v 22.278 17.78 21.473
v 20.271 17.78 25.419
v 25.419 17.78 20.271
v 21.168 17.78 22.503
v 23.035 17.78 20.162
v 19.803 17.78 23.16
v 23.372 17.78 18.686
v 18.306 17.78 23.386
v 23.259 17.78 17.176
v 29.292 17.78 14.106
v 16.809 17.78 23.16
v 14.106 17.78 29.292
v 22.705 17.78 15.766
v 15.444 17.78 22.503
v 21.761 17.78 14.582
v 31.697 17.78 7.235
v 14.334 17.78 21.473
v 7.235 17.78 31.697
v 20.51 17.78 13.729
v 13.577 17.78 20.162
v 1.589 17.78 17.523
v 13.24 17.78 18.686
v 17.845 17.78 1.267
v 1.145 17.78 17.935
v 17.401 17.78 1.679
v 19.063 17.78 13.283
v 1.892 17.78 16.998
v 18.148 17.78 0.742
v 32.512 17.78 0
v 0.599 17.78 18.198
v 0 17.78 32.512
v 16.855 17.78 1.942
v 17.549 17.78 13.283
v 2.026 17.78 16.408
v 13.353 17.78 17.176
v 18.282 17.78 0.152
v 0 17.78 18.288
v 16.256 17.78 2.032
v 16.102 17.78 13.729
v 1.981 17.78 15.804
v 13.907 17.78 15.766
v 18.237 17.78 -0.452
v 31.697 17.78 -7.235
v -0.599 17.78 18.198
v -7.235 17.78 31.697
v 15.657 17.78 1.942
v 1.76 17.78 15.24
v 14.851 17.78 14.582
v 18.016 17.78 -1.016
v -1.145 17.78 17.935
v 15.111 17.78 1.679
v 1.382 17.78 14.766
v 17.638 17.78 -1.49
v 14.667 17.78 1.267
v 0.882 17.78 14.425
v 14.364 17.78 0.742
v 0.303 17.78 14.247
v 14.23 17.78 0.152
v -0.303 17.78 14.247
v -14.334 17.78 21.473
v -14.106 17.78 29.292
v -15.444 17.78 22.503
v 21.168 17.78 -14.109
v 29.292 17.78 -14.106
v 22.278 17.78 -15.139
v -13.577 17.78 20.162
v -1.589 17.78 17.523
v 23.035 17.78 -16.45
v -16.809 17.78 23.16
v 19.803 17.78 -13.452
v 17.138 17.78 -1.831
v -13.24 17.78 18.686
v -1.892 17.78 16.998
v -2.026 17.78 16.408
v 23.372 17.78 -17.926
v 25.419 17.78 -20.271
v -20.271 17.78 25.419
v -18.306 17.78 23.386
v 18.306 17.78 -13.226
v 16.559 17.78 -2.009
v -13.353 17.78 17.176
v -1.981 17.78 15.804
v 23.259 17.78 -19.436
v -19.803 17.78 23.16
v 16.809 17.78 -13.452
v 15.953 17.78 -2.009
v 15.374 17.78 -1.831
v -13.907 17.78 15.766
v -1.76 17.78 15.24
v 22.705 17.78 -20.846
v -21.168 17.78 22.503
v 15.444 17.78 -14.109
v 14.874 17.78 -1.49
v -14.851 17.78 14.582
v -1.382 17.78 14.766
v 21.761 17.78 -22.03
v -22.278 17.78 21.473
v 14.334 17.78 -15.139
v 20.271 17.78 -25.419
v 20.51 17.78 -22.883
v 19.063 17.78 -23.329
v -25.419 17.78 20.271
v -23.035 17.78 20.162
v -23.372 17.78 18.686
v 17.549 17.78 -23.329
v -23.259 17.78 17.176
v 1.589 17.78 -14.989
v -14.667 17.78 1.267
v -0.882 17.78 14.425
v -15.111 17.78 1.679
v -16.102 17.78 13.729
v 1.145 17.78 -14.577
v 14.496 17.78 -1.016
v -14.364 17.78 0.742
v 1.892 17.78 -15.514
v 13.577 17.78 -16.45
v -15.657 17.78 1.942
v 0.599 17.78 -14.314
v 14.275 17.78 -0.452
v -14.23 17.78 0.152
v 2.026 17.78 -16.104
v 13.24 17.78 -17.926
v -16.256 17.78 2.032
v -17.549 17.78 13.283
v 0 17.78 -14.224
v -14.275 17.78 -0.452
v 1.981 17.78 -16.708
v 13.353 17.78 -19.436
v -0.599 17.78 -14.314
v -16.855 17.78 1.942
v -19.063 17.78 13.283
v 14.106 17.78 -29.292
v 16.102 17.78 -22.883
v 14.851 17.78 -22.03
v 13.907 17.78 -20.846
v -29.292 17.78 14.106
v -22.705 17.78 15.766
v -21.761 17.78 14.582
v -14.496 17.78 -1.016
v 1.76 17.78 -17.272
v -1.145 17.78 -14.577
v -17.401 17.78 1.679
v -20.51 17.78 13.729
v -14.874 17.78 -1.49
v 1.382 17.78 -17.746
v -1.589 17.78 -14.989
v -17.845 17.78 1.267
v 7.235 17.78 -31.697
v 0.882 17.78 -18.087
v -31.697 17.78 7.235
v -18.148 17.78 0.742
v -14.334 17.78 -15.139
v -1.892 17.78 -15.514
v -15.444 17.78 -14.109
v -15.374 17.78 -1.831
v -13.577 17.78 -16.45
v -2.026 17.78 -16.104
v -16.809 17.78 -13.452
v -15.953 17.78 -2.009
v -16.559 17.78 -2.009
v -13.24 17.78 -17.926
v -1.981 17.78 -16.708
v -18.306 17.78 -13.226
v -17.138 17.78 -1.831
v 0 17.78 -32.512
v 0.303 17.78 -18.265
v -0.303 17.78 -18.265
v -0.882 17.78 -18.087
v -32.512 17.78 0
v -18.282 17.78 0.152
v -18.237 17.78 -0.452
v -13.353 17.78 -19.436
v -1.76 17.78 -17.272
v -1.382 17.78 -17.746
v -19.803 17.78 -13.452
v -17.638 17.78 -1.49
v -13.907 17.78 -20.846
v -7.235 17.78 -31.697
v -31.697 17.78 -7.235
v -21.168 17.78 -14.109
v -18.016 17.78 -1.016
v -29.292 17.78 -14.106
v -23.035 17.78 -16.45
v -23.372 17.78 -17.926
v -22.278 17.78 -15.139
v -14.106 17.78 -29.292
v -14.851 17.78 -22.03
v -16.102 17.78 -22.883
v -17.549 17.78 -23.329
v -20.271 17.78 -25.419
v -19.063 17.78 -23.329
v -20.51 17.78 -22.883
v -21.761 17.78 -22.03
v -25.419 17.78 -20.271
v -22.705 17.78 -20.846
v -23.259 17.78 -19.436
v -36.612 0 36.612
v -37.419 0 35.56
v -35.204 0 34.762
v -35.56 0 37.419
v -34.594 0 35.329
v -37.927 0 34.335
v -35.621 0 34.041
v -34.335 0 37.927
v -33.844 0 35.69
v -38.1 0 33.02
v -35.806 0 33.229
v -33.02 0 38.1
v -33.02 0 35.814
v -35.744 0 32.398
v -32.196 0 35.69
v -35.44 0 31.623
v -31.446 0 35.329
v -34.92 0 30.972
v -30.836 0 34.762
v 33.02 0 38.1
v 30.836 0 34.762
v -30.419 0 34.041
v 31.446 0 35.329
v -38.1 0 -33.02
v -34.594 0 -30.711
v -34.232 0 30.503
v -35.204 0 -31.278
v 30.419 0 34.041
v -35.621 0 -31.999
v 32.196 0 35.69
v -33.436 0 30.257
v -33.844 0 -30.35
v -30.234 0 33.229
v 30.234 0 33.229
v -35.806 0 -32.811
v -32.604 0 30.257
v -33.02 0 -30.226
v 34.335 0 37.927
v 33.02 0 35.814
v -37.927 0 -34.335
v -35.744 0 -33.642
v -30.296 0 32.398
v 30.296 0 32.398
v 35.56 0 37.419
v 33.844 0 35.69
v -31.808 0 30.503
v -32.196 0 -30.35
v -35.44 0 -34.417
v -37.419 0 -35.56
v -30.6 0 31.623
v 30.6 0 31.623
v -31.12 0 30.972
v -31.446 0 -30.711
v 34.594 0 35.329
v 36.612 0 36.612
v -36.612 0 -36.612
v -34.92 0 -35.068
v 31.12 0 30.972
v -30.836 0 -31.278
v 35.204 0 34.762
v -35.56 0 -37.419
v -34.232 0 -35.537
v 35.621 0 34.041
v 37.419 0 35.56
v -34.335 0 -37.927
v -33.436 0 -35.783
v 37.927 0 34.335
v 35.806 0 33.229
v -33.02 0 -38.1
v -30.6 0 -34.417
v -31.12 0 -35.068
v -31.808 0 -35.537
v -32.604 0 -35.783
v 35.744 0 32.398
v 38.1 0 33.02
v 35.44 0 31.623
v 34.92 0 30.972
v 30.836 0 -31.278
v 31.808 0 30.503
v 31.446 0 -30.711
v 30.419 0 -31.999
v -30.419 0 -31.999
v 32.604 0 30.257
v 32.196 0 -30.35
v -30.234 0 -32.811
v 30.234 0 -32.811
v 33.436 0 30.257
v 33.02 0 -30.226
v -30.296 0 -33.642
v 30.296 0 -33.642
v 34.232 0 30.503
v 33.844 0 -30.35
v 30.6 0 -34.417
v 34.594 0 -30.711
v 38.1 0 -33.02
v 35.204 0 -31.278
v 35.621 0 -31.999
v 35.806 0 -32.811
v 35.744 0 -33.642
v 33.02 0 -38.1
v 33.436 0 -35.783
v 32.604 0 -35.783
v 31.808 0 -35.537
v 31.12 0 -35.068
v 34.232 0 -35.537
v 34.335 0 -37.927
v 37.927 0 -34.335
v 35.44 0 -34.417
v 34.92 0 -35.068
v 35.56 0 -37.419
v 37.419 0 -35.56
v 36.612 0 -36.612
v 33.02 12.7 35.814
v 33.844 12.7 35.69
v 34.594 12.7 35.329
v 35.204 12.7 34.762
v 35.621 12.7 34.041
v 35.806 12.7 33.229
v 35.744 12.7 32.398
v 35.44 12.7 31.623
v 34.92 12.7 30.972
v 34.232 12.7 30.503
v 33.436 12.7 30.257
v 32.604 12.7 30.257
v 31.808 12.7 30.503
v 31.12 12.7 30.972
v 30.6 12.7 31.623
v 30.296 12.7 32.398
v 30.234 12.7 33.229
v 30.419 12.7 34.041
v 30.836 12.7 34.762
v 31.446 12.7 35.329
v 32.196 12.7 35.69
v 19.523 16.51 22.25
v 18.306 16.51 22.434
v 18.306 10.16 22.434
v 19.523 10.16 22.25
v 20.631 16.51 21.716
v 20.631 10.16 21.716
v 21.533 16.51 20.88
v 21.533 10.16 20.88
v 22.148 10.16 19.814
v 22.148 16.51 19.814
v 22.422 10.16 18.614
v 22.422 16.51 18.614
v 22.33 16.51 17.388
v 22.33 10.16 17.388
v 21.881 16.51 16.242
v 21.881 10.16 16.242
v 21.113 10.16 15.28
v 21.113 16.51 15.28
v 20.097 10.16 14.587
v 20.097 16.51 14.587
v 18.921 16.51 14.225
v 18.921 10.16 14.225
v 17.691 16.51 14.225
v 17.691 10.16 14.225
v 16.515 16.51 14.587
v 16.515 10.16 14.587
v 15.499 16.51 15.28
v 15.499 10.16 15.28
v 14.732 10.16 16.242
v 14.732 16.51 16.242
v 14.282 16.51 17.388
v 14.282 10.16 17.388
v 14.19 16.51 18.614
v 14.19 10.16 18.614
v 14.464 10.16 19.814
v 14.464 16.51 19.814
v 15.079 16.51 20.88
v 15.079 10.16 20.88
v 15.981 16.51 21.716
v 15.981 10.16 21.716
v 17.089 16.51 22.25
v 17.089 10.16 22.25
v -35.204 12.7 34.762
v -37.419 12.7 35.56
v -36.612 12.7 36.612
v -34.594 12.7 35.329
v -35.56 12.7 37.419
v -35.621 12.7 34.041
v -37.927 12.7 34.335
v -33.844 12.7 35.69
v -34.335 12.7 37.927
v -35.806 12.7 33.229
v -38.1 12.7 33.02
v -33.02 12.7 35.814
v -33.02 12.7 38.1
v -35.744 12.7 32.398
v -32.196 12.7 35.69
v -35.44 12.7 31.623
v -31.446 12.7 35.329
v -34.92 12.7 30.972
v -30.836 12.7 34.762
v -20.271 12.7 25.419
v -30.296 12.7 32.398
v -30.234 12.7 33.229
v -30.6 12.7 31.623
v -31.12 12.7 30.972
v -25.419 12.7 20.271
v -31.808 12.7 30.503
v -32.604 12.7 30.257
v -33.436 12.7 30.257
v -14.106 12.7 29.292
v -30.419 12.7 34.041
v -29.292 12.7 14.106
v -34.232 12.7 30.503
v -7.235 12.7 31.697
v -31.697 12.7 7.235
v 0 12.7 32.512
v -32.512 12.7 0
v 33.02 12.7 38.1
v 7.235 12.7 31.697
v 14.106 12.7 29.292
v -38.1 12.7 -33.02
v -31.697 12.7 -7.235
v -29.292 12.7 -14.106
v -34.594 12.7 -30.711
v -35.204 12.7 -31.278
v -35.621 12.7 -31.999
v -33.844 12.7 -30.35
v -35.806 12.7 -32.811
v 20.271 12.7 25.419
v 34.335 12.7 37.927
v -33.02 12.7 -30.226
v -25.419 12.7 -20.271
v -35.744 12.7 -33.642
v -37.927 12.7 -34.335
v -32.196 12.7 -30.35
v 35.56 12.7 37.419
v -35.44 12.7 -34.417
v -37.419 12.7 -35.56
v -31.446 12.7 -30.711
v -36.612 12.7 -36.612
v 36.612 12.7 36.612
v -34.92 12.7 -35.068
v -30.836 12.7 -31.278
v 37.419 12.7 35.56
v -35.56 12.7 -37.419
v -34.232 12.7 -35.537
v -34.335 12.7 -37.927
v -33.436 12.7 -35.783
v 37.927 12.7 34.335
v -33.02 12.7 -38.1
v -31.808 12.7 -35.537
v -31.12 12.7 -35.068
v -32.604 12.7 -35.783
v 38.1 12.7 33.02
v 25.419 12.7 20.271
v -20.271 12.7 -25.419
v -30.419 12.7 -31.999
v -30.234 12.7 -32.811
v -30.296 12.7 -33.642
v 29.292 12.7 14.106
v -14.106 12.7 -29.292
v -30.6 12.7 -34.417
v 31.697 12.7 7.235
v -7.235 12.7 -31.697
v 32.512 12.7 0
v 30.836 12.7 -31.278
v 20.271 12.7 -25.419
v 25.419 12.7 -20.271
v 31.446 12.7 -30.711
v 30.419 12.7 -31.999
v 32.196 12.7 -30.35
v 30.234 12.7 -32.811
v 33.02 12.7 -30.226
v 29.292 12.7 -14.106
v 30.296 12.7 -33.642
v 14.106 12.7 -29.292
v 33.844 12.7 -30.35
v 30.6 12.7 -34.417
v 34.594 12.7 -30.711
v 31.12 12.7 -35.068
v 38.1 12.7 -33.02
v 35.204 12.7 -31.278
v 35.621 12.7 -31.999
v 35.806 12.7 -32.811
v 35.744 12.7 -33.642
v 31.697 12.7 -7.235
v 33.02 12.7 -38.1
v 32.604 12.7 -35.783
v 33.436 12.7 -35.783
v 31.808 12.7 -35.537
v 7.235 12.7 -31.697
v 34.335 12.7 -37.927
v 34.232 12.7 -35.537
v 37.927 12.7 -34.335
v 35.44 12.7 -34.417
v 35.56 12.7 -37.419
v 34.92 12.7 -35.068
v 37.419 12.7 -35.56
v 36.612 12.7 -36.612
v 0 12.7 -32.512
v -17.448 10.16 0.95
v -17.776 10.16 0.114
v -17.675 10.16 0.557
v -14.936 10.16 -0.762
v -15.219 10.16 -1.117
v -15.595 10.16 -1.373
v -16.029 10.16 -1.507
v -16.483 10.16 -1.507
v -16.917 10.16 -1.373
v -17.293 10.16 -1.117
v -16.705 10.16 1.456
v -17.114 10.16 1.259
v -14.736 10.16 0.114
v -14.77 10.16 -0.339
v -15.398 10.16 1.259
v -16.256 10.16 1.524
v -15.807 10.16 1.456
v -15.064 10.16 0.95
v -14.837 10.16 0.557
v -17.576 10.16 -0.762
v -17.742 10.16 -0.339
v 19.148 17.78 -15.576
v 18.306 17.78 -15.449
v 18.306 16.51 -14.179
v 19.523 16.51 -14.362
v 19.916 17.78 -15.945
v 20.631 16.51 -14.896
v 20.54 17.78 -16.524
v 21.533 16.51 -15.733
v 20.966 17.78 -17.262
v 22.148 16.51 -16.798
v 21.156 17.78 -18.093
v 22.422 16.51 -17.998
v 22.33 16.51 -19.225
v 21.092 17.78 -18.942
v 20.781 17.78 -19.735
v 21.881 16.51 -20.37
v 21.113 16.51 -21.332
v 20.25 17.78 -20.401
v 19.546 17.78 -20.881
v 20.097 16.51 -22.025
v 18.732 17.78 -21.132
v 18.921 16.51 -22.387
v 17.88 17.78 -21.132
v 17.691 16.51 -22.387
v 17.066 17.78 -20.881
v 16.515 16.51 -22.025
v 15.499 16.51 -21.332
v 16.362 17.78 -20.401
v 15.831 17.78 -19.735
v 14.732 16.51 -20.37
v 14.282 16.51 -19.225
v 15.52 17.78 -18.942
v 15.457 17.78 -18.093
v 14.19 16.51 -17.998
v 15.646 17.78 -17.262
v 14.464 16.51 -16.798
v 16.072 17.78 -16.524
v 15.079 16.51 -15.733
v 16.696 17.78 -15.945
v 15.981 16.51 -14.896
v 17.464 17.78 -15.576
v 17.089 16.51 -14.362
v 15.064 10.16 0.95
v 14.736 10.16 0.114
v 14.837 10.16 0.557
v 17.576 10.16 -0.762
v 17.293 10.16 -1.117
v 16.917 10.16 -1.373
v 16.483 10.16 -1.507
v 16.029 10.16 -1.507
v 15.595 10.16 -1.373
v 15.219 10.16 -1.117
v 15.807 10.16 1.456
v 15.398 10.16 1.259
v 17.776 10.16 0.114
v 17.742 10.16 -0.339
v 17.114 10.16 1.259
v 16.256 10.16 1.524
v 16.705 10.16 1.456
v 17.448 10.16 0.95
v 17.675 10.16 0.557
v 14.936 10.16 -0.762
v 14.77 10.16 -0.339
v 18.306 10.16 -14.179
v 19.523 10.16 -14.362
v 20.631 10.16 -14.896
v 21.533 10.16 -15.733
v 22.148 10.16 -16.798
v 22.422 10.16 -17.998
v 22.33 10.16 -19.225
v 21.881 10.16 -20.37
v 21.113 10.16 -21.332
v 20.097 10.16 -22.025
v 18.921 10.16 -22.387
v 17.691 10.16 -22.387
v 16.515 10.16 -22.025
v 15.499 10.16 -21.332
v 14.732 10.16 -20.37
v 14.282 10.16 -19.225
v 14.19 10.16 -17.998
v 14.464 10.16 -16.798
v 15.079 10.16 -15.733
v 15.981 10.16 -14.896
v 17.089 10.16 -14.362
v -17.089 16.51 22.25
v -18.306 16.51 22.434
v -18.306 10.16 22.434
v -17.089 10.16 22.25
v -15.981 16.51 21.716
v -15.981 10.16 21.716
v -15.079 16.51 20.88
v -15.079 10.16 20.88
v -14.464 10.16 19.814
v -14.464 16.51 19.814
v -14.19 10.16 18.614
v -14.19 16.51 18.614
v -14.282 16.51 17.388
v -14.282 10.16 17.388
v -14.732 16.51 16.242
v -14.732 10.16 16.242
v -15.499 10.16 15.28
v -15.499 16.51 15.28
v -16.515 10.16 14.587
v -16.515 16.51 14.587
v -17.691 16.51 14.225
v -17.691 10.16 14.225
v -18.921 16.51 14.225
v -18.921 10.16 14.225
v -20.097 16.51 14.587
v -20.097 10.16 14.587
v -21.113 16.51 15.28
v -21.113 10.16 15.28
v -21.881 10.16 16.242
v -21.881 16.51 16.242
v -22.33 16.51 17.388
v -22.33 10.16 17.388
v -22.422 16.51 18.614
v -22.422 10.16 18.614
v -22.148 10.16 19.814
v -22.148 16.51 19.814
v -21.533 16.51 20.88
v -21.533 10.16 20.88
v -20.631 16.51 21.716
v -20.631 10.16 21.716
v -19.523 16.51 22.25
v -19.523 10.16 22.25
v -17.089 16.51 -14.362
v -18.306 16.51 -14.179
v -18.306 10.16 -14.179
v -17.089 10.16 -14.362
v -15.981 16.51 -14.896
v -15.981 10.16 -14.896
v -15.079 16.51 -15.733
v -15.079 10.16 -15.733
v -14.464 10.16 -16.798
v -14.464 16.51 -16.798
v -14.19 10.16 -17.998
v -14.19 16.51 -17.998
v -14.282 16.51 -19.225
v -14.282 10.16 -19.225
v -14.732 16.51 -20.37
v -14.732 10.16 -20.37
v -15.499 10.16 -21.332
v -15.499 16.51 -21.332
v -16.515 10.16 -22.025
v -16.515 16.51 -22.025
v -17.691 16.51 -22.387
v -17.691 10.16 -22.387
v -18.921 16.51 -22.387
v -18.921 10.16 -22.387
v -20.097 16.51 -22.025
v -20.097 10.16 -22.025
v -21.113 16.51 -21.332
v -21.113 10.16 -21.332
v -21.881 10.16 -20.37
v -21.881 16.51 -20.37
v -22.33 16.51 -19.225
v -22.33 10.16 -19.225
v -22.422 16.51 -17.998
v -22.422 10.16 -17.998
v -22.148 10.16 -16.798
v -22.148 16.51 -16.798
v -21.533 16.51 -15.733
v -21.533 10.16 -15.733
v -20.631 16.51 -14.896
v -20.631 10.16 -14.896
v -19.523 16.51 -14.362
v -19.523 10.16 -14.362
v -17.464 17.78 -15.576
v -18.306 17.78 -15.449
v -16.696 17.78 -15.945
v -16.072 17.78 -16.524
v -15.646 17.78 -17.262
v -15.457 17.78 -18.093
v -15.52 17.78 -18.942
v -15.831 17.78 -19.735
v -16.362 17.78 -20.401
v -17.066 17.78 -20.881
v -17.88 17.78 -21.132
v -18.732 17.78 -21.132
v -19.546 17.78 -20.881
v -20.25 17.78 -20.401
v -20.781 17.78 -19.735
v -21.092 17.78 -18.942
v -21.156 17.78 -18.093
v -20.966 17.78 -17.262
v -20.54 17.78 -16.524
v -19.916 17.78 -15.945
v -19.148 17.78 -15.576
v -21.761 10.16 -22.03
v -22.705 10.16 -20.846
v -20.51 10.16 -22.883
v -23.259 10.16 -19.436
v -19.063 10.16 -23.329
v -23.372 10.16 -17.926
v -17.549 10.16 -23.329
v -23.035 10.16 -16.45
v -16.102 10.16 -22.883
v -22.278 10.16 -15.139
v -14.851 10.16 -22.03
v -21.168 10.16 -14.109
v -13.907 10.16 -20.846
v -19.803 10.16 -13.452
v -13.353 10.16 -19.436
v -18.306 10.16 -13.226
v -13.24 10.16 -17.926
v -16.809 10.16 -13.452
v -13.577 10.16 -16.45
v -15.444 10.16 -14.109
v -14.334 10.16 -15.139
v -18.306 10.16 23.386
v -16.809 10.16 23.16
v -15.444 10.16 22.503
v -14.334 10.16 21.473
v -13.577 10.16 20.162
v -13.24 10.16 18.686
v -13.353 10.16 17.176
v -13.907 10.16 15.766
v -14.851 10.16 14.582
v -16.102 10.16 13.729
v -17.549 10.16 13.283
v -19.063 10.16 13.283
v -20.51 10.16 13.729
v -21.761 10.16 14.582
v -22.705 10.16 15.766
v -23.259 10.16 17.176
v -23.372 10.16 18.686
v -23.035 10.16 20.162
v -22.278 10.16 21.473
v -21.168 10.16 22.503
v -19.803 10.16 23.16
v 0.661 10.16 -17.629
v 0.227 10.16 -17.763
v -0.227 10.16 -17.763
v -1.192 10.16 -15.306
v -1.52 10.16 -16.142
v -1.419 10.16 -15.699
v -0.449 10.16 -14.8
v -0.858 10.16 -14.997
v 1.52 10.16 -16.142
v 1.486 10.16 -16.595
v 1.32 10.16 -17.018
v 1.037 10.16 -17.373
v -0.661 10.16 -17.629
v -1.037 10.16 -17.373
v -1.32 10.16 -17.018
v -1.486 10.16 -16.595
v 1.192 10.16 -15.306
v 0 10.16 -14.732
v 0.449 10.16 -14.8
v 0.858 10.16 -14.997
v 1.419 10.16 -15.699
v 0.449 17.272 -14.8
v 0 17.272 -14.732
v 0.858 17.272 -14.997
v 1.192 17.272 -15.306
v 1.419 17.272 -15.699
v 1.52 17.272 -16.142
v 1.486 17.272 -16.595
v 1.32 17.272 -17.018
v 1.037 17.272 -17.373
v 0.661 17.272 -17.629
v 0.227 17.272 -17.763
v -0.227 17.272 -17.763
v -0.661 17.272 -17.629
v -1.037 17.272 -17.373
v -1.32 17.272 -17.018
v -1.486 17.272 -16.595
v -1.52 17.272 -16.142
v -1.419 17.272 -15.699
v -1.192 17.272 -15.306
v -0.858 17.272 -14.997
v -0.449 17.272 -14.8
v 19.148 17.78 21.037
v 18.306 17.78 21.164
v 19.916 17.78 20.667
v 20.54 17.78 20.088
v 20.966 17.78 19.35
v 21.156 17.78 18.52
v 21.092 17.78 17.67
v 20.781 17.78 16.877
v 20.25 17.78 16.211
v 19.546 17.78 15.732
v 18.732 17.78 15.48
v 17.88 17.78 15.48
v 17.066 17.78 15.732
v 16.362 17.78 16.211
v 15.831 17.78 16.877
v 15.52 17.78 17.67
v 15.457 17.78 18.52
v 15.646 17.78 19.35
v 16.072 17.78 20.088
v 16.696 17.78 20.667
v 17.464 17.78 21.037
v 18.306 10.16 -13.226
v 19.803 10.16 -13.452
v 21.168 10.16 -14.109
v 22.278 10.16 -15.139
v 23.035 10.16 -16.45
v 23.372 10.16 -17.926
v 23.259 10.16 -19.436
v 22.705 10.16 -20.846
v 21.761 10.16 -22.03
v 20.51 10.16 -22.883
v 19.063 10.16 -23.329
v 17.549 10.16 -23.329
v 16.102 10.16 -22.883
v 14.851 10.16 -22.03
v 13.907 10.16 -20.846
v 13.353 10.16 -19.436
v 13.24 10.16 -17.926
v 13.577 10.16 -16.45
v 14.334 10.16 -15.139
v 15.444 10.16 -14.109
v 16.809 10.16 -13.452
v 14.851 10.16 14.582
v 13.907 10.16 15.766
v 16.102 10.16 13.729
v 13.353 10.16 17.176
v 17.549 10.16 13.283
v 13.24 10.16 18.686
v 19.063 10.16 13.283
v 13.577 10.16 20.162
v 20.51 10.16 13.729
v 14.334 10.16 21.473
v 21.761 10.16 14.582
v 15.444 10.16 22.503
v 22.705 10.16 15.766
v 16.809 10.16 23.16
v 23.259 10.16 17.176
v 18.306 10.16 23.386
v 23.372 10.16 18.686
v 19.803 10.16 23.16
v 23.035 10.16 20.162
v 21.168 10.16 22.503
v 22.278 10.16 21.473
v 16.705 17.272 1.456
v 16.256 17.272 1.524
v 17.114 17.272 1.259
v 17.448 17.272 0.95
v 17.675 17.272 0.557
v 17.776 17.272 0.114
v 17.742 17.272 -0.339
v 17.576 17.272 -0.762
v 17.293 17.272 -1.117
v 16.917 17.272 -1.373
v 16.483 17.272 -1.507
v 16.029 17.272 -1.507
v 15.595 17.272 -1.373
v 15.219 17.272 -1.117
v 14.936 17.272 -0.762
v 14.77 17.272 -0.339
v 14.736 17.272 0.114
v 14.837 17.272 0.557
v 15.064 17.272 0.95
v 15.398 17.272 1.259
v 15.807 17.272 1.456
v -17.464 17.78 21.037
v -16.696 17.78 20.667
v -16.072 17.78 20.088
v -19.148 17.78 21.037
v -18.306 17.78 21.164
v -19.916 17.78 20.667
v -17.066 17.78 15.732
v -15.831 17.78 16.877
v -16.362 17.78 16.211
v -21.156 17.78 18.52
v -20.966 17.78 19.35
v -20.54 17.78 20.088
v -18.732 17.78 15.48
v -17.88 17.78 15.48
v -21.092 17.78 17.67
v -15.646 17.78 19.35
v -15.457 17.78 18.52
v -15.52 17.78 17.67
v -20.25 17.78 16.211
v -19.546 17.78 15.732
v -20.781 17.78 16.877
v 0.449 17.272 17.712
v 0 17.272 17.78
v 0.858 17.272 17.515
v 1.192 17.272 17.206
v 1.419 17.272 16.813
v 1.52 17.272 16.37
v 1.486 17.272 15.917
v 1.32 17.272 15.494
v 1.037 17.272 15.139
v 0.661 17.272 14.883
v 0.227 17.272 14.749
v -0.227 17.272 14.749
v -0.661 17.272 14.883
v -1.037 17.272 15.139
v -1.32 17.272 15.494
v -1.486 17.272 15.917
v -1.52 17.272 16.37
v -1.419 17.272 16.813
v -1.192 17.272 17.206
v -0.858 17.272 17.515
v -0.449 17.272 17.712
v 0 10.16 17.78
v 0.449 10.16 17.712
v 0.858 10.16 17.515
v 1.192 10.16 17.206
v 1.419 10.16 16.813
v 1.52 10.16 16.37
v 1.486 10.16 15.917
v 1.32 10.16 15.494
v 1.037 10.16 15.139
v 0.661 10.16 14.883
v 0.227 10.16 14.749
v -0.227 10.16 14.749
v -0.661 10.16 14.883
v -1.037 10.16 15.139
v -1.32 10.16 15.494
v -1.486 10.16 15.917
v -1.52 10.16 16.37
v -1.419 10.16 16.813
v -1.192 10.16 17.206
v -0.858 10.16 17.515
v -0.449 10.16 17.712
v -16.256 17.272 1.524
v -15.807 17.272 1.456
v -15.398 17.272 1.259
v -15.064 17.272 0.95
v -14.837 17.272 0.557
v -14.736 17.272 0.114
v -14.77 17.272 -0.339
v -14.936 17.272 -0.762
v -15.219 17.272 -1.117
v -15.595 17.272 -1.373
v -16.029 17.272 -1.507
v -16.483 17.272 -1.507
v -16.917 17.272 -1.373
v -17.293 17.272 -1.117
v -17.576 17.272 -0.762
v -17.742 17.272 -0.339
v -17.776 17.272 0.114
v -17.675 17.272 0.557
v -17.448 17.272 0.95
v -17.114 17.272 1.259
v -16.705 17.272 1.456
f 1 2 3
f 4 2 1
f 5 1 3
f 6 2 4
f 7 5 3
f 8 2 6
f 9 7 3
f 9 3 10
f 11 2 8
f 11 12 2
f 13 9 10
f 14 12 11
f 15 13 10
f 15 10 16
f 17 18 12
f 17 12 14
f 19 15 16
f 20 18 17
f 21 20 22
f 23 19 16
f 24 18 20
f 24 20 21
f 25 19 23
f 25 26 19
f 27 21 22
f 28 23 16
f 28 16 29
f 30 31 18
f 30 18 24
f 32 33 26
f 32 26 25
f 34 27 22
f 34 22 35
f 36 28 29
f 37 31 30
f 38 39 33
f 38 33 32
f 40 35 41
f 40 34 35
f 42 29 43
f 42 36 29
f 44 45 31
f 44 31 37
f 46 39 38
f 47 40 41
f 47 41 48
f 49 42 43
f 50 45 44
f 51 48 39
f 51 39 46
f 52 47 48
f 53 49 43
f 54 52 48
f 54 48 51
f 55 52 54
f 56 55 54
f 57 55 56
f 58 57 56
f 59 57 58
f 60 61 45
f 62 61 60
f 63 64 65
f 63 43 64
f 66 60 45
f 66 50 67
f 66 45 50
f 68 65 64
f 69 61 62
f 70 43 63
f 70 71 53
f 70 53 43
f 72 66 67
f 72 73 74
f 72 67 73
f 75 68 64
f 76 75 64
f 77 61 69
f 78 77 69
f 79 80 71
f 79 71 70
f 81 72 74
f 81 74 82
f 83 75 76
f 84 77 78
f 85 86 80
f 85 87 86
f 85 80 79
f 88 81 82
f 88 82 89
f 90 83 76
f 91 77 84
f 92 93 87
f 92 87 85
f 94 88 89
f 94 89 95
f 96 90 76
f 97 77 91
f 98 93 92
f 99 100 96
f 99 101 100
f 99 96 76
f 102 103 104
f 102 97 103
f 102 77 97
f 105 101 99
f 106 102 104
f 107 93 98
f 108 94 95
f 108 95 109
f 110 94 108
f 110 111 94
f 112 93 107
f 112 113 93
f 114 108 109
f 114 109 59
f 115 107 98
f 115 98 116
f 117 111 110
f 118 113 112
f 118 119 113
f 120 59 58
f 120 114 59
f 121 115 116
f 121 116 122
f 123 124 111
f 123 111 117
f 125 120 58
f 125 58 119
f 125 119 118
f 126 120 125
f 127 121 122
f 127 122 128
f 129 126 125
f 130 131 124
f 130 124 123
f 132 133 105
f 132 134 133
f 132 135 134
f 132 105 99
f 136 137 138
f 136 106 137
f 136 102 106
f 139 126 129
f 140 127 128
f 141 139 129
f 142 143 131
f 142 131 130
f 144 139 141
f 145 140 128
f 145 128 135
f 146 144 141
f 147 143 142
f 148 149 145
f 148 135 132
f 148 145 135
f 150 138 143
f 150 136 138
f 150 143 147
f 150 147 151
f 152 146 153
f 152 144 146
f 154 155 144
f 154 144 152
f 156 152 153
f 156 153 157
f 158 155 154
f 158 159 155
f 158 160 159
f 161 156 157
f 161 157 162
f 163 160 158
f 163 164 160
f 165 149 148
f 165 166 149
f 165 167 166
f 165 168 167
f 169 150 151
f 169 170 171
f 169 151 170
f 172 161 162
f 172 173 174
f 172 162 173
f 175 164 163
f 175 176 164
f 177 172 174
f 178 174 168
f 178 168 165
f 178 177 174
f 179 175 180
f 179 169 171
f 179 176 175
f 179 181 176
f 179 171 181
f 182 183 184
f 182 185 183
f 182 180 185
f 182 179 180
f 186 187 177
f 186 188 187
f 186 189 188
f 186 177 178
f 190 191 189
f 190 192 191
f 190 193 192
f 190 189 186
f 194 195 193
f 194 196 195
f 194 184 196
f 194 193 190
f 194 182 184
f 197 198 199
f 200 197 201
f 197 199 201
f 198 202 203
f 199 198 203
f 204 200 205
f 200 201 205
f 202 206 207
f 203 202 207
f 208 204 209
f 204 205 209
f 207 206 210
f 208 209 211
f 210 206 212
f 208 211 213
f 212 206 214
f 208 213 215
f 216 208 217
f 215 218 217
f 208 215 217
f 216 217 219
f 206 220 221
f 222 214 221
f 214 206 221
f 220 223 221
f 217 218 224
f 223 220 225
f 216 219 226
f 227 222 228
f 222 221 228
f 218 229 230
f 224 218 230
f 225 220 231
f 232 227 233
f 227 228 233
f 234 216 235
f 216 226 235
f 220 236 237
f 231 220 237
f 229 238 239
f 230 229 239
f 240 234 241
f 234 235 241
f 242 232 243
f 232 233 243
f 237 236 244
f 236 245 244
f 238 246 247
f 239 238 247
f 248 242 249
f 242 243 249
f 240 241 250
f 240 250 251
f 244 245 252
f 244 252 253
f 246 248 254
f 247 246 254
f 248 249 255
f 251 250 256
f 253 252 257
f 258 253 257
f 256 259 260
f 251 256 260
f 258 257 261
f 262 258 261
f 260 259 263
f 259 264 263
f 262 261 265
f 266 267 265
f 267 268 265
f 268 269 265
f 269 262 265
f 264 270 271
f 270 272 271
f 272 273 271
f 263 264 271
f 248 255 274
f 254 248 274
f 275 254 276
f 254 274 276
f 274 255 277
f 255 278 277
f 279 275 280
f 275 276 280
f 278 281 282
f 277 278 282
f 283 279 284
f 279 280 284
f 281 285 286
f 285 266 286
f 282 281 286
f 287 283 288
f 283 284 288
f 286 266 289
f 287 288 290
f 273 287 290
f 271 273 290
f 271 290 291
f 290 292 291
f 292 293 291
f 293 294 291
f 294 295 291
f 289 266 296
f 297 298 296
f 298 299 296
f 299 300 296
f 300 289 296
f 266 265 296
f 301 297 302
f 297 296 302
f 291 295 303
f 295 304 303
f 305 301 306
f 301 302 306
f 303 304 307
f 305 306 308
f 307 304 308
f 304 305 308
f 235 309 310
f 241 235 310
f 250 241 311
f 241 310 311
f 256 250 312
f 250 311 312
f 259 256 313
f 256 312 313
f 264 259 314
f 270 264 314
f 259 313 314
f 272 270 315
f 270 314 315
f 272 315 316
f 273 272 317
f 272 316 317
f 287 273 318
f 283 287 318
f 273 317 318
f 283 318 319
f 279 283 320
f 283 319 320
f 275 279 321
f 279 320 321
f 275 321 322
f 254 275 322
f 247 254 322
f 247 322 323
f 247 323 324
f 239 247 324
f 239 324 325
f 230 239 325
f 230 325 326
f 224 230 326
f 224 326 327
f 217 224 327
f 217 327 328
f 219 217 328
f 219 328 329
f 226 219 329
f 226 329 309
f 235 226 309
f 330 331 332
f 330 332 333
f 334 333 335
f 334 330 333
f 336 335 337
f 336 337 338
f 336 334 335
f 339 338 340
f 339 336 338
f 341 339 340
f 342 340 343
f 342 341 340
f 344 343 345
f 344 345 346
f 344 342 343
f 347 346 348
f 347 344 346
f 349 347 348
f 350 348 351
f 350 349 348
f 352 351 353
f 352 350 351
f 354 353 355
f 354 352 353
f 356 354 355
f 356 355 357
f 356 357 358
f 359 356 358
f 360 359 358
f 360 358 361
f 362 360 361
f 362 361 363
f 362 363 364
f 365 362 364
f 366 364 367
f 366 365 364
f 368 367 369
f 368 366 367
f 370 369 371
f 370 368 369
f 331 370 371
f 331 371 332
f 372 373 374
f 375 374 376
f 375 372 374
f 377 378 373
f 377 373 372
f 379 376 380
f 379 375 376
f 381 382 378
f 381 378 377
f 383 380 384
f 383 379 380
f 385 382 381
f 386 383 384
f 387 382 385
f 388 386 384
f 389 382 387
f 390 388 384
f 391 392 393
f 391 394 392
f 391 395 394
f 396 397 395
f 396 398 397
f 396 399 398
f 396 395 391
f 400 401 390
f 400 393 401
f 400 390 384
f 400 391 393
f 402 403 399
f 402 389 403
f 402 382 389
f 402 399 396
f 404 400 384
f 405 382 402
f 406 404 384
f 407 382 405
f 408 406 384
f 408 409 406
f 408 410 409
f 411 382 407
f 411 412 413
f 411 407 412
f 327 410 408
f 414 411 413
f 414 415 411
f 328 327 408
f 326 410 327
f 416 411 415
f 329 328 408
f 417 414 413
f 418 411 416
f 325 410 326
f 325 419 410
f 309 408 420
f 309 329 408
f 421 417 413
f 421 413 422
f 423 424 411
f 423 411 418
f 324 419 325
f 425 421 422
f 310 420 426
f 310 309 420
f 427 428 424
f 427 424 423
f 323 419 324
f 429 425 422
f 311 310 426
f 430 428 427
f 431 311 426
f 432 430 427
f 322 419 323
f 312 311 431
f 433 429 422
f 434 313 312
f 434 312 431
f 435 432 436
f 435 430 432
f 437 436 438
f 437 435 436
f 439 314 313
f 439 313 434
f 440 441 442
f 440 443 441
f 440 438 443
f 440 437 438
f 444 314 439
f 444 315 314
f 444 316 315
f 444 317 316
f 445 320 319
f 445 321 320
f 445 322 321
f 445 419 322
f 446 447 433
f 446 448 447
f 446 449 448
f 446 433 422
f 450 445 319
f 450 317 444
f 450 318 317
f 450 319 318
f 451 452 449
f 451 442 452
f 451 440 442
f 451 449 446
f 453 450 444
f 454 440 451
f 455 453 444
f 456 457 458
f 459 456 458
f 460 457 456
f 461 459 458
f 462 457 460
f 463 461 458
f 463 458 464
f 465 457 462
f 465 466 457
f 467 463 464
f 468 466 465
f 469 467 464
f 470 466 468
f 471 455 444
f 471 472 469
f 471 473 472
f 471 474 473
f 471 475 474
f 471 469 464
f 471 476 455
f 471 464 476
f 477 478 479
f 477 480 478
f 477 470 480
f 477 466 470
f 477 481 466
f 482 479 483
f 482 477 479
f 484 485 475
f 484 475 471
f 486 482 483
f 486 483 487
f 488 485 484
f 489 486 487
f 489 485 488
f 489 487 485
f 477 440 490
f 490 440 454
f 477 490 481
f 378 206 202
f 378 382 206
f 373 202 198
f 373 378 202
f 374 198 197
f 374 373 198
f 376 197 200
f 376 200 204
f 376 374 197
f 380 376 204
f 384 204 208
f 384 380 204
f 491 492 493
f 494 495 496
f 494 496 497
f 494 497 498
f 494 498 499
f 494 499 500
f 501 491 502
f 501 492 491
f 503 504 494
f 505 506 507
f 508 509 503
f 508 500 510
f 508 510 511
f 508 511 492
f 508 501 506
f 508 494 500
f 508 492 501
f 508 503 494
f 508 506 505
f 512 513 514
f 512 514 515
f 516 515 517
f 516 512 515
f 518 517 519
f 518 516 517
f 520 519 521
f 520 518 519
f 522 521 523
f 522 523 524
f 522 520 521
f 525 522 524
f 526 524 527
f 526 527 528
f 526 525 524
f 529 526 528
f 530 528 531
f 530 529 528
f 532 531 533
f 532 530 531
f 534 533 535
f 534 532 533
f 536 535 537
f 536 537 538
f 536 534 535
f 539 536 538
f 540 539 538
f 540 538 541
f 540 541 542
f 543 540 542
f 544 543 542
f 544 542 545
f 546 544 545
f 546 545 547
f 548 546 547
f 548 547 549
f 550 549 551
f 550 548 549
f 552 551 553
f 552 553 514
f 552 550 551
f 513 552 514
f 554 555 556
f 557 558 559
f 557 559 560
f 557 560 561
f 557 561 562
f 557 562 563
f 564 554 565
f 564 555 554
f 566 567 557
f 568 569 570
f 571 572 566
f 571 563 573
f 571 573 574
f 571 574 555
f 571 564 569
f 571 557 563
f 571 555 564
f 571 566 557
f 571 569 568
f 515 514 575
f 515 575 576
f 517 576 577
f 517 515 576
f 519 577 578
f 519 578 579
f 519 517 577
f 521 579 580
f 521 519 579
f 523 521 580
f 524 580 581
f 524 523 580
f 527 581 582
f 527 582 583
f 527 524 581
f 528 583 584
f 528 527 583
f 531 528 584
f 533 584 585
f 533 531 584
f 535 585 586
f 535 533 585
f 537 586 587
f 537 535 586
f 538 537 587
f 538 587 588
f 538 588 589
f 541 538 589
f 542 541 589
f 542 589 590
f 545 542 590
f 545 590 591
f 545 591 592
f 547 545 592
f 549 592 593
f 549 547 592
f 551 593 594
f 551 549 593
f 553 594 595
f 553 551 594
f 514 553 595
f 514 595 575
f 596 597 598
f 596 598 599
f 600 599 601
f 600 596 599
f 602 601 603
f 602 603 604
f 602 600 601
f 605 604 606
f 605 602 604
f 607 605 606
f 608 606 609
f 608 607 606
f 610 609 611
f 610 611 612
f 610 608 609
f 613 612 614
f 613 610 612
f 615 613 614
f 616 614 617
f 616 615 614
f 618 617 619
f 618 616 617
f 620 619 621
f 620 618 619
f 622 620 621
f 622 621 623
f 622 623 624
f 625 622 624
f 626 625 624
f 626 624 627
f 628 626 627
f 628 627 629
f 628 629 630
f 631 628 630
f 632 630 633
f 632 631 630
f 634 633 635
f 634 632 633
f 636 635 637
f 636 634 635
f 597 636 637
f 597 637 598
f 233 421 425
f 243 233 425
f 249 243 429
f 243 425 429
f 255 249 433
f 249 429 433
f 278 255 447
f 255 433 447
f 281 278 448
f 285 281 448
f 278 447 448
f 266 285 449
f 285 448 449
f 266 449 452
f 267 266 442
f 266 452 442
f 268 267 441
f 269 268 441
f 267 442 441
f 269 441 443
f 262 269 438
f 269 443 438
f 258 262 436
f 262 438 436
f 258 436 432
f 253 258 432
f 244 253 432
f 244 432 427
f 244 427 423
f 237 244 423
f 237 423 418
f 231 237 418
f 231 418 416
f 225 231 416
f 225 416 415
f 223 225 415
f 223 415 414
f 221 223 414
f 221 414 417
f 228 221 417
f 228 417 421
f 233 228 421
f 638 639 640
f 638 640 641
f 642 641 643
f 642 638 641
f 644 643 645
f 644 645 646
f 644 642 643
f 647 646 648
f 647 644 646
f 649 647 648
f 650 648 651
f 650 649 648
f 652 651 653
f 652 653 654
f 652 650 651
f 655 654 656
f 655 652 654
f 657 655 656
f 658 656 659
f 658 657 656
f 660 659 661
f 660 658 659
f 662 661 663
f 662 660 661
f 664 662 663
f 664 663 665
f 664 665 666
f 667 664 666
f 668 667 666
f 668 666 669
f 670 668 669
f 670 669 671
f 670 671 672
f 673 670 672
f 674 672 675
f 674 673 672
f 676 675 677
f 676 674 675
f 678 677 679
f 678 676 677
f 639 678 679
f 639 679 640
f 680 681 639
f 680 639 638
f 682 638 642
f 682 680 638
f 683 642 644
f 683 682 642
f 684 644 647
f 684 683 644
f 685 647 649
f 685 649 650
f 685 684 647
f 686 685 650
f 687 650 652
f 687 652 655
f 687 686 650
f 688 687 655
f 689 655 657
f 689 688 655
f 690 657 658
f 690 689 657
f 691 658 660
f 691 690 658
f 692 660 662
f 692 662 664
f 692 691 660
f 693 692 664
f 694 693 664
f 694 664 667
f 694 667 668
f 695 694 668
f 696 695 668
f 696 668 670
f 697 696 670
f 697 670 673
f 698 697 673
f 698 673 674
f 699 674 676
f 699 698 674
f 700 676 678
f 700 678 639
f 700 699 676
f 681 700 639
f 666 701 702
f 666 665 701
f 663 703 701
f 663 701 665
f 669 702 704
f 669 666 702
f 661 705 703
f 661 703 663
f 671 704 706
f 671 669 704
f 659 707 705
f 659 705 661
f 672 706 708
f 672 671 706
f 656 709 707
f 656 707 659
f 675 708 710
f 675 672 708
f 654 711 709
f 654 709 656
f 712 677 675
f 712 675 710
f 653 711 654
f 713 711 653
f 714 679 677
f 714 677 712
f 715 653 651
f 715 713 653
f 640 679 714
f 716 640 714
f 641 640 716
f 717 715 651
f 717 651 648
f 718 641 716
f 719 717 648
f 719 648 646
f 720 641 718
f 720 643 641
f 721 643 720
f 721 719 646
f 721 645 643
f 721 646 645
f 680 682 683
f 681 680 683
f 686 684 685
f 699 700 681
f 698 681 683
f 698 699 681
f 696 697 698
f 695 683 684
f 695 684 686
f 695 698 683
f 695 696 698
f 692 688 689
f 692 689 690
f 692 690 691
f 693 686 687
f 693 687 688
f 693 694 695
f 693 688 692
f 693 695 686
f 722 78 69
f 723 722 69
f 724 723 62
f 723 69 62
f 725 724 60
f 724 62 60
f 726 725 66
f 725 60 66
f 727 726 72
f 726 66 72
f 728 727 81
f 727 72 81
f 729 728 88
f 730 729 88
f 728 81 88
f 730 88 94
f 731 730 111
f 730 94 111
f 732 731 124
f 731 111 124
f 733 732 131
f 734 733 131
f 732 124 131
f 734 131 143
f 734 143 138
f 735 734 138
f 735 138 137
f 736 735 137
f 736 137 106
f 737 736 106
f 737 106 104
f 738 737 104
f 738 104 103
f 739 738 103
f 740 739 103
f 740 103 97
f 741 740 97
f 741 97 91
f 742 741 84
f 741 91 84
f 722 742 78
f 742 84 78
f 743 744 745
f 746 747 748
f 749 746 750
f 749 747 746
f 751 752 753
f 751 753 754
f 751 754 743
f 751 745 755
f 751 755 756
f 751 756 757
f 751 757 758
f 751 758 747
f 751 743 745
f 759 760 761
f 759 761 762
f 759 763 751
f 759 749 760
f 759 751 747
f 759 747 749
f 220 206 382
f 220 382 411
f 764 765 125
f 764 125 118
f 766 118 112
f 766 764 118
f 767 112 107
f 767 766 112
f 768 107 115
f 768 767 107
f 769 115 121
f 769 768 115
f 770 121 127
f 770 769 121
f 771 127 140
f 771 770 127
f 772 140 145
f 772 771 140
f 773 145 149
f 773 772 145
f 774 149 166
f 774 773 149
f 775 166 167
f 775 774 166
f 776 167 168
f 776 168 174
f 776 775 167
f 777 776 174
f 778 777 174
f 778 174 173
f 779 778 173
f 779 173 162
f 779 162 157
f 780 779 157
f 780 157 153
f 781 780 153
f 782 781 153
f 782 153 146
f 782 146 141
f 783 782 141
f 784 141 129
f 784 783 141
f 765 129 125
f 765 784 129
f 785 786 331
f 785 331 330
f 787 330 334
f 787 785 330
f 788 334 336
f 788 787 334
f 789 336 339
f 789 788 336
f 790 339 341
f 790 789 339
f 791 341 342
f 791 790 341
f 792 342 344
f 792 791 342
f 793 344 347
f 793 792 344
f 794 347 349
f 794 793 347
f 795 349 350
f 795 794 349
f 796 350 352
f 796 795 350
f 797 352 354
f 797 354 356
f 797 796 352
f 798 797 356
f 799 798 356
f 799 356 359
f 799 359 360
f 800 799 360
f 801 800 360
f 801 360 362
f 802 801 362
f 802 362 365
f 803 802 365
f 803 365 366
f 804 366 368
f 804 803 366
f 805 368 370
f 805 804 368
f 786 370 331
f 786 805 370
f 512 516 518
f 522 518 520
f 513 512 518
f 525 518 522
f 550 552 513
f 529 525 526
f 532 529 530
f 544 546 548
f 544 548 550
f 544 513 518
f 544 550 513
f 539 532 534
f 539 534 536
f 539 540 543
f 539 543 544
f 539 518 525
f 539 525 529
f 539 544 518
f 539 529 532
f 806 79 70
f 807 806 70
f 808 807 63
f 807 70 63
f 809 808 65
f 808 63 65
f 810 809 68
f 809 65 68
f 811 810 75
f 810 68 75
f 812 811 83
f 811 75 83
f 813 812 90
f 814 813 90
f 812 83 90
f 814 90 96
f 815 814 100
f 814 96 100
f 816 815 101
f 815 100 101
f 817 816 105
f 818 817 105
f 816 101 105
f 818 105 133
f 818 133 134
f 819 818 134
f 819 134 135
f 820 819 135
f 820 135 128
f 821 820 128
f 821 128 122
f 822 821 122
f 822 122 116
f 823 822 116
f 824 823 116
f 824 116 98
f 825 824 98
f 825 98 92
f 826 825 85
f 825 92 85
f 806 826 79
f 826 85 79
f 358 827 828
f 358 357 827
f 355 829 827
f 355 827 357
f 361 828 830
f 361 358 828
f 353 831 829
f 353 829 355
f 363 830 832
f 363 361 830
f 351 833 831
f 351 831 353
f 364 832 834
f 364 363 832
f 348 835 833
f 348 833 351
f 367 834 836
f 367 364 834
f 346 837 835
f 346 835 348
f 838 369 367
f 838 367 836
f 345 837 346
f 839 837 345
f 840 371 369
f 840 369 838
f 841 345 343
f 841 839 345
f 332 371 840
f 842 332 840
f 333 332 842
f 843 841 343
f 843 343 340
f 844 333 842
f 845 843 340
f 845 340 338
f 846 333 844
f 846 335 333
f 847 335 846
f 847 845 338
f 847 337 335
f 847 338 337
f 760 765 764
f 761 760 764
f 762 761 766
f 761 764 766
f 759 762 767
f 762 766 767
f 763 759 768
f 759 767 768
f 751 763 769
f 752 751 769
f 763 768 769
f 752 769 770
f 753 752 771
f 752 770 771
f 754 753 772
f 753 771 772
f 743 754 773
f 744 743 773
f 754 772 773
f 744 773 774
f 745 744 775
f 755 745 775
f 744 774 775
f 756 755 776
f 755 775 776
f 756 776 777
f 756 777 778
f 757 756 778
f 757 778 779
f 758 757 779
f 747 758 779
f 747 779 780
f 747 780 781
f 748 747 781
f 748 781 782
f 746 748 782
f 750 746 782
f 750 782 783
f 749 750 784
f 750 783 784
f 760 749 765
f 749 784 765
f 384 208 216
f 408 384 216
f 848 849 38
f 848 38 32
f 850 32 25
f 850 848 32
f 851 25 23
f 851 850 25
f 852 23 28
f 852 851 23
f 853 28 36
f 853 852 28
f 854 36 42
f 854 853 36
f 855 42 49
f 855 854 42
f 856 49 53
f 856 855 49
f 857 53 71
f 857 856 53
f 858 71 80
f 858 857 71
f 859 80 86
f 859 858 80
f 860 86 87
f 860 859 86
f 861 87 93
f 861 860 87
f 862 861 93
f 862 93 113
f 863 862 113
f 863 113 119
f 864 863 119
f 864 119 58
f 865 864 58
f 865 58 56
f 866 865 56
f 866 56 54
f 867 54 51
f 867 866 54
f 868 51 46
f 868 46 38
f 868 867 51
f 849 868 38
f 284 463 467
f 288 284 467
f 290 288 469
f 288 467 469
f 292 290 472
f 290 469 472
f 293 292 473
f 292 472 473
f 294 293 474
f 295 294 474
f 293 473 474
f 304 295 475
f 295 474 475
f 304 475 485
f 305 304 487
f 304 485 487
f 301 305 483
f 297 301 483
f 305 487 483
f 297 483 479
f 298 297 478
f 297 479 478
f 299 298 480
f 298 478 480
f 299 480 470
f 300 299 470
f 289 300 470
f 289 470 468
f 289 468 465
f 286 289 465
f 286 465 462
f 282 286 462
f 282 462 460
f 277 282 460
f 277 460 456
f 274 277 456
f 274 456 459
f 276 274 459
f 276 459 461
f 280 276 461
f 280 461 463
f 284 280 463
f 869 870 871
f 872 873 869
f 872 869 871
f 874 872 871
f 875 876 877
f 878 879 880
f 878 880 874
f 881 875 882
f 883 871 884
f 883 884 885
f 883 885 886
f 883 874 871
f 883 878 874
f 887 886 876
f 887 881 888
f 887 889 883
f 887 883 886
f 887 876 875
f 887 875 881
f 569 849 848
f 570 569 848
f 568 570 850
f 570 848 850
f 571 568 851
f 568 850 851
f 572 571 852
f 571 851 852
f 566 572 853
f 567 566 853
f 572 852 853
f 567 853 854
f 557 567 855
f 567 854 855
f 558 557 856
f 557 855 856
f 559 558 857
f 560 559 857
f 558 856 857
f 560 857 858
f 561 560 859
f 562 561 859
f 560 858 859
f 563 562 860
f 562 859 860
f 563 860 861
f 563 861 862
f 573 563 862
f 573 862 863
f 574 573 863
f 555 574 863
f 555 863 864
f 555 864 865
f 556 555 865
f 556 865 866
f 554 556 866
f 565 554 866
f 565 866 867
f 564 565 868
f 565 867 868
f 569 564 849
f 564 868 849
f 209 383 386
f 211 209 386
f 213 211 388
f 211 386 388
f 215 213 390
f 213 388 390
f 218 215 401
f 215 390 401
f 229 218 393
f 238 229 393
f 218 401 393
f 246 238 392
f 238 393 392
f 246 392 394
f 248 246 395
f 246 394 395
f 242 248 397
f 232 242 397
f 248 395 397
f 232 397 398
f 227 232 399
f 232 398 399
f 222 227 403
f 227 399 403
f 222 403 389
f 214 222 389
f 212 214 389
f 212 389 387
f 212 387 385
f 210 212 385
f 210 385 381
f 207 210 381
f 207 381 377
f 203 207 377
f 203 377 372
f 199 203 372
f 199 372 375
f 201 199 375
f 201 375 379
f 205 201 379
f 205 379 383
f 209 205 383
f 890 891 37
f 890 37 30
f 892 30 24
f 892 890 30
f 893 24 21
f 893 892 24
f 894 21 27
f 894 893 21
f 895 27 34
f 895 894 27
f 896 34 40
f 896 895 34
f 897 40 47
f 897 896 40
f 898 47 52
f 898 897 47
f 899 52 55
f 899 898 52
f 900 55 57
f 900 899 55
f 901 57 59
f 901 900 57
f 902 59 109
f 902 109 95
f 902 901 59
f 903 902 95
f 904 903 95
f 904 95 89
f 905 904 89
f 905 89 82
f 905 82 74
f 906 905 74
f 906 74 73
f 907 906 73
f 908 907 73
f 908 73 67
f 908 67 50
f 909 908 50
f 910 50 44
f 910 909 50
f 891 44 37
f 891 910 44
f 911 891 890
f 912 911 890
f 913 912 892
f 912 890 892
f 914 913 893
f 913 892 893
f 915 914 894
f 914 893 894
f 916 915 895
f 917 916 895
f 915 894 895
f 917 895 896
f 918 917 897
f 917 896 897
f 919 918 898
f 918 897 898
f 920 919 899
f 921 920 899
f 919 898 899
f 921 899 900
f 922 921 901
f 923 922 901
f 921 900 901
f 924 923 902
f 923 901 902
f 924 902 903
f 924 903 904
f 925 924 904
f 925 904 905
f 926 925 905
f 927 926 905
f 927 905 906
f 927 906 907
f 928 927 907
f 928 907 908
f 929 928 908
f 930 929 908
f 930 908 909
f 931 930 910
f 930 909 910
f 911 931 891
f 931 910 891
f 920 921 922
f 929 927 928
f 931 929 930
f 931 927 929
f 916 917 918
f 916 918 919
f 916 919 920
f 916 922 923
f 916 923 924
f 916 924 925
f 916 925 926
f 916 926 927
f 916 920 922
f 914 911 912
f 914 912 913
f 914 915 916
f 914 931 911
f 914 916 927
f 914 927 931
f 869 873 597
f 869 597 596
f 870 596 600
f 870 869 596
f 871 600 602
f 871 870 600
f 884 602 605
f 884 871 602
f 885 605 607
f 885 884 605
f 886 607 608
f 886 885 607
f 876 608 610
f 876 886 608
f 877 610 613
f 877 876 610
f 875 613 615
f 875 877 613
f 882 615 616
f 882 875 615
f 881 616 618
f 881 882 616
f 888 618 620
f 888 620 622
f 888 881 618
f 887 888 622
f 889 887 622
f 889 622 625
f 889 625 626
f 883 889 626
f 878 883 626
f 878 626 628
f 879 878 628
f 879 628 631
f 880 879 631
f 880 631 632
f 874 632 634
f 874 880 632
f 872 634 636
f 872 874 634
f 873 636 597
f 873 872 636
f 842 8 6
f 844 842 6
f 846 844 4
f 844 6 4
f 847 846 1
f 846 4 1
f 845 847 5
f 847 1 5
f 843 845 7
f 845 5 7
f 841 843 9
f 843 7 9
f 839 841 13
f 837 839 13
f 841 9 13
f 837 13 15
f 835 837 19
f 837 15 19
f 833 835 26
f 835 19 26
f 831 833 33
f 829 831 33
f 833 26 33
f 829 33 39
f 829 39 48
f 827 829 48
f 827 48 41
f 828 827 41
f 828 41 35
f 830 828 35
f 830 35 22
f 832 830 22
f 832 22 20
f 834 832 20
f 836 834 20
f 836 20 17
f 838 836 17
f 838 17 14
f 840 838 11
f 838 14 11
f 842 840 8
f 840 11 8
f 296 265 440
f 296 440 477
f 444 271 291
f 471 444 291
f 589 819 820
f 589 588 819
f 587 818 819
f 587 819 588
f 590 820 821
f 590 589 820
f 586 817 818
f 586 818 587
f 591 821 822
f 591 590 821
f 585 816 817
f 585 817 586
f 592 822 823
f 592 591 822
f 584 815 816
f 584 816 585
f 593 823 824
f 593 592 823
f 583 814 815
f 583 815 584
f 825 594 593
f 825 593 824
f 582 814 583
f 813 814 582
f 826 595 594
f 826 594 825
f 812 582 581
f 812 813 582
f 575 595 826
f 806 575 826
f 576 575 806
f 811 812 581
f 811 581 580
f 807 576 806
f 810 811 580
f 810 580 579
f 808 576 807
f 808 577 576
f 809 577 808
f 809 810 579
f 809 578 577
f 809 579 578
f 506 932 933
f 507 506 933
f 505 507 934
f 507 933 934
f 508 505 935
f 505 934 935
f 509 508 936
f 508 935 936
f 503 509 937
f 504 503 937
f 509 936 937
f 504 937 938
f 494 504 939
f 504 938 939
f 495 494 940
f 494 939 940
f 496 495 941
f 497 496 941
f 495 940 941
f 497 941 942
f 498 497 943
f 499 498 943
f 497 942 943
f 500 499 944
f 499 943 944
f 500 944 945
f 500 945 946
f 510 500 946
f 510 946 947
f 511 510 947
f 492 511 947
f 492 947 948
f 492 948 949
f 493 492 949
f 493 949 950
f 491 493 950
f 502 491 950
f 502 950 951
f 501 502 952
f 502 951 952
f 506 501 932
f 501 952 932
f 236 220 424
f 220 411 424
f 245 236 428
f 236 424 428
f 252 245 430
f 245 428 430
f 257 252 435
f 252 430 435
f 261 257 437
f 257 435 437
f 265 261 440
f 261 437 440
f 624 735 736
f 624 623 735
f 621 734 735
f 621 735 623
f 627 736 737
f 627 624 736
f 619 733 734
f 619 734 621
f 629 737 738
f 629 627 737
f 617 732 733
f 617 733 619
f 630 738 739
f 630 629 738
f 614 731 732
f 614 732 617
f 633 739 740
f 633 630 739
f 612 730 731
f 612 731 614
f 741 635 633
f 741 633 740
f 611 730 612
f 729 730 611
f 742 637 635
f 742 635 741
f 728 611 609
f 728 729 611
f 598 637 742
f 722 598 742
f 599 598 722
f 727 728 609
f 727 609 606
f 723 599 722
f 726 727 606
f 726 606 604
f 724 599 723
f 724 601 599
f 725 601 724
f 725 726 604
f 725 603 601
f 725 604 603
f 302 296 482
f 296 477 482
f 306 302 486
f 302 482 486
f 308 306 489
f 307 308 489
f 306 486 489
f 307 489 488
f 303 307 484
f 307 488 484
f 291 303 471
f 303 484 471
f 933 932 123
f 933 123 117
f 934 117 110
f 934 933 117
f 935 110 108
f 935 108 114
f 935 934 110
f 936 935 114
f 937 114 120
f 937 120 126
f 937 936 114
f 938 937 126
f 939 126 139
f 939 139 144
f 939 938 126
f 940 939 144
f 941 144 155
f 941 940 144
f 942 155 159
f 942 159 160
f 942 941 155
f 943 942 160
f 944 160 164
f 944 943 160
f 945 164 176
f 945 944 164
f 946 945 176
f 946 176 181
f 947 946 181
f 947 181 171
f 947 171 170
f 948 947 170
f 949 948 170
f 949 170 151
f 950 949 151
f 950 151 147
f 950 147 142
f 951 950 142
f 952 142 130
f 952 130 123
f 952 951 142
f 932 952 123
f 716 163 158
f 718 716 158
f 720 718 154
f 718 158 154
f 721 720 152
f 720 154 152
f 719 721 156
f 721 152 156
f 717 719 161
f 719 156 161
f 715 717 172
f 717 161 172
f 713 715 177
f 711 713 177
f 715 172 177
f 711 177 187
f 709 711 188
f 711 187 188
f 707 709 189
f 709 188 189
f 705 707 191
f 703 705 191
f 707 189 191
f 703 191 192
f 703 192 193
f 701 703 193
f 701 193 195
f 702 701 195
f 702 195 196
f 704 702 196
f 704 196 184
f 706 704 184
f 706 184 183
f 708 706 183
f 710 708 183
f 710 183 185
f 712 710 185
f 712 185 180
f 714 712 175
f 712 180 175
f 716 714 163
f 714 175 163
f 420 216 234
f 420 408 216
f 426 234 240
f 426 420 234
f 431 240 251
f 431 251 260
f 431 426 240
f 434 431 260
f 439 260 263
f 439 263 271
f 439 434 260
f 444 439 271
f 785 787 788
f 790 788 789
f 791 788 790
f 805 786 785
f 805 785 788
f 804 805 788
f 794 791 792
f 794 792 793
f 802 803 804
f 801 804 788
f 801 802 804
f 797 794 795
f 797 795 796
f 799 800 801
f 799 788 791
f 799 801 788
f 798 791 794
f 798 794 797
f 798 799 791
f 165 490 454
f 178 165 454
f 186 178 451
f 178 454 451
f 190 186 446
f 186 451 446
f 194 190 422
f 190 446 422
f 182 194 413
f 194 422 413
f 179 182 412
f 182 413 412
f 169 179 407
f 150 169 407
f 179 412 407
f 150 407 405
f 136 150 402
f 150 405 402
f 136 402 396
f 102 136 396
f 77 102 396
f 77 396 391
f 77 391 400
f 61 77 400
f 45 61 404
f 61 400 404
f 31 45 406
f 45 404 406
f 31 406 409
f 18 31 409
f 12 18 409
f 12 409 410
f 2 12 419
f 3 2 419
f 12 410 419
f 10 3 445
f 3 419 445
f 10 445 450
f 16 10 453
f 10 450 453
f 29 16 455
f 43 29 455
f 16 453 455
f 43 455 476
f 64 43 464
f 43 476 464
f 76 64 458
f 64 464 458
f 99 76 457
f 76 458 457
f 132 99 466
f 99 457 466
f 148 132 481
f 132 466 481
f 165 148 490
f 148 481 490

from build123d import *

# Parameters (mm, degrees)
SKETCH1_W           = 76.2
SKETCH1_H           = 76.2
BOSS_EXTRUDE1_DEPTH = 12.7
SKETCH2_R           = 2.794
CUT_EXTRUDE1_DEPTH  = 56.358016583
SKETCH2_3_R         = 32.512
BOSS_EXTRUDE2_DEPTH = 5.08
FILLET1_R           = 5.08
SKETCH3_R           = 5.08
SKETCH3_R_2         = 4.1275
SKETCH3_R_3         = 1.524
CUT_EXTRUDE2_DEPTH  = 7.62
CHAMFER1_SIZE       = 1.27
CHAMFER2_SIZE       = 0.508


with BuildPart() as part:
    # Sketch1 → Boss-Extrude1 (new body)
    with BuildSketch(Plane(origin=(0, 0, 0), x_dir=(1, 0, 0), z_dir=(0, 1, 0))):
        Rectangle(SKETCH1_W, SKETCH1_H)
    extrude(amount=BOSS_EXTRUDE1_DEPTH)

    # Sketch2 → Cut-Extrude1 (cut, through all)
    with BuildSketch(Plane(origin=(0, 12.7, 0), x_dir=(1, 0, 0), z_dir=(0, 1, 0))):
        with Locations((33.02, 33.02)):
            Circle(SKETCH2_R)
        with Locations((33.02, -33.02)):
            Circle(SKETCH2_R)
        with Locations((-33.02, -33.02)):
            Circle(SKETCH2_R)
        with Locations((-33.02, 33.02)):
            Circle(SKETCH2_R)
    extrude(amount=-CUT_EXTRUDE1_DEPTH, mode=Mode.SUBTRACT)

    # Sketch2<3> → Boss-Extrude2 (add)
    with BuildSketch(Plane(origin=(0, 12.7, 0), x_dir=(1, 0, 0), z_dir=(0, 1, 0))):
        Circle(SKETCH2_3_R)
    extrude(amount=BOSS_EXTRUDE2_DEPTH)

    # Fillet1
    fillet1_edges = [part.edges().sort_by_distance(p)[0] for p in [
        (-38.1, 6.35, 38.1),
        (38.1, 6.35, 38.1),
        (38.1, 6.35, -38.1),
        (-38.1, 6.35, -38.1),
    ]]
    fillet(fillet1_edges, radius=FILLET1_R)

    # Sketch3 → Cut-Extrude2 (cut)
    # profile 1 of 8: a face of its own
    with BuildSketch(Plane(origin=(0, 17.78, 0), x_dir=(1, 0, 0), z_dir=(0, 1, 0))):
        with Locations((18.306051224, 18.306051224)):
            Circle(SKETCH3_R)
        with Locations((18.306051224, 18.306051224)):
            Circle(SKETCH3_R_2, mode=Mode.SUBTRACT)
    # profile 2 of 8: a face of its own
    with BuildSketch(Plane(origin=(0, 17.78, 0), x_dir=(1, 0, 0), z_dir=(0, 1, 0))):
        with Locations((18.306051224, -18.306051224)):
            Circle(SKETCH3_R)
        with Locations((18.306051224, -18.306051224)):
            Circle(SKETCH3_R_2, mode=Mode.SUBTRACT)
    # profile 3 of 8: a face of its own
    with BuildSketch(Plane(origin=(0, 17.78, 0), x_dir=(1, 0, 0), z_dir=(0, 1, 0))):
        with Locations((-18.306051224, -18.306051224)):
            Circle(SKETCH3_R)
        with Locations((-18.306051224, -18.306051224)):
            Circle(SKETCH3_R_2, mode=Mode.SUBTRACT)
    # profile 4 of 8: a face of its own
    with BuildSketch(Plane(origin=(0, 17.78, 0), x_dir=(1, 0, 0), z_dir=(0, 1, 0))):
        with Locations((-18.306051224, 18.306051224)):
            Circle(SKETCH3_R)
        with Locations((-18.306051224, 18.306051224)):
            Circle(SKETCH3_R_2, mode=Mode.SUBTRACT)
    # profile 5 of 8: a face of its own
    with BuildSketch(Plane(origin=(0, 17.78, 0), x_dir=(1, 0, 0), z_dir=(0, 1, 0))):
        with Locations((0, 16.256)):
            Circle(SKETCH3_R_3)
    # profile 6 of 8: a face of its own
    with BuildSketch(Plane(origin=(0, 17.78, 0), x_dir=(1, 0, 0), z_dir=(0, 1, 0))):
        with Locations((16.256, 0)):
            Circle(SKETCH3_R_3)
    # profile 7 of 8: a face of its own
    with BuildSketch(Plane(origin=(0, 17.78, 0), x_dir=(1, 0, 0), z_dir=(0, 1, 0))):
        with Locations((0, -16.256)):
            Circle(SKETCH3_R_3)
    # profile 8 of 8: a face of its own
    with BuildSketch(Plane(origin=(0, 17.78, 0), x_dir=(1, 0, 0), z_dir=(0, 1, 0))):
        with Locations((-16.256, 0)):
            Circle(SKETCH3_R_3)
    extrude(amount=-CUT_EXTRUDE2_DEPTH, mode=Mode.SUBTRACT)

    # Chamfer1
    chamfer1_edges = [part.edges().sort_by_distance(p)[0] for p in [
        (14.178551224, 17.78, 18.306051224),
        (14.178551224, 17.78, -18.306051224),
        (-22.433551224, 17.78, -18.306051224),
        (-22.433551224, 17.78, 18.306051224),
    ]]
    chamfer(chamfer1_edges, length=CHAMFER1_SIZE)

    # Chamfer2
    chamfer2_edges = [part.edges().sort_by_distance(p)[0] for p in [
        (-1.524, 17.78, 16.256),
        (14.732, 17.78, 0),
        (-1.524, 17.78, -16.256),
        (-17.78, 17.78, 0),
    ]]
    chamfer(chamfer2_edges, length=CHAMFER2_SIZE)


solid = part.part
